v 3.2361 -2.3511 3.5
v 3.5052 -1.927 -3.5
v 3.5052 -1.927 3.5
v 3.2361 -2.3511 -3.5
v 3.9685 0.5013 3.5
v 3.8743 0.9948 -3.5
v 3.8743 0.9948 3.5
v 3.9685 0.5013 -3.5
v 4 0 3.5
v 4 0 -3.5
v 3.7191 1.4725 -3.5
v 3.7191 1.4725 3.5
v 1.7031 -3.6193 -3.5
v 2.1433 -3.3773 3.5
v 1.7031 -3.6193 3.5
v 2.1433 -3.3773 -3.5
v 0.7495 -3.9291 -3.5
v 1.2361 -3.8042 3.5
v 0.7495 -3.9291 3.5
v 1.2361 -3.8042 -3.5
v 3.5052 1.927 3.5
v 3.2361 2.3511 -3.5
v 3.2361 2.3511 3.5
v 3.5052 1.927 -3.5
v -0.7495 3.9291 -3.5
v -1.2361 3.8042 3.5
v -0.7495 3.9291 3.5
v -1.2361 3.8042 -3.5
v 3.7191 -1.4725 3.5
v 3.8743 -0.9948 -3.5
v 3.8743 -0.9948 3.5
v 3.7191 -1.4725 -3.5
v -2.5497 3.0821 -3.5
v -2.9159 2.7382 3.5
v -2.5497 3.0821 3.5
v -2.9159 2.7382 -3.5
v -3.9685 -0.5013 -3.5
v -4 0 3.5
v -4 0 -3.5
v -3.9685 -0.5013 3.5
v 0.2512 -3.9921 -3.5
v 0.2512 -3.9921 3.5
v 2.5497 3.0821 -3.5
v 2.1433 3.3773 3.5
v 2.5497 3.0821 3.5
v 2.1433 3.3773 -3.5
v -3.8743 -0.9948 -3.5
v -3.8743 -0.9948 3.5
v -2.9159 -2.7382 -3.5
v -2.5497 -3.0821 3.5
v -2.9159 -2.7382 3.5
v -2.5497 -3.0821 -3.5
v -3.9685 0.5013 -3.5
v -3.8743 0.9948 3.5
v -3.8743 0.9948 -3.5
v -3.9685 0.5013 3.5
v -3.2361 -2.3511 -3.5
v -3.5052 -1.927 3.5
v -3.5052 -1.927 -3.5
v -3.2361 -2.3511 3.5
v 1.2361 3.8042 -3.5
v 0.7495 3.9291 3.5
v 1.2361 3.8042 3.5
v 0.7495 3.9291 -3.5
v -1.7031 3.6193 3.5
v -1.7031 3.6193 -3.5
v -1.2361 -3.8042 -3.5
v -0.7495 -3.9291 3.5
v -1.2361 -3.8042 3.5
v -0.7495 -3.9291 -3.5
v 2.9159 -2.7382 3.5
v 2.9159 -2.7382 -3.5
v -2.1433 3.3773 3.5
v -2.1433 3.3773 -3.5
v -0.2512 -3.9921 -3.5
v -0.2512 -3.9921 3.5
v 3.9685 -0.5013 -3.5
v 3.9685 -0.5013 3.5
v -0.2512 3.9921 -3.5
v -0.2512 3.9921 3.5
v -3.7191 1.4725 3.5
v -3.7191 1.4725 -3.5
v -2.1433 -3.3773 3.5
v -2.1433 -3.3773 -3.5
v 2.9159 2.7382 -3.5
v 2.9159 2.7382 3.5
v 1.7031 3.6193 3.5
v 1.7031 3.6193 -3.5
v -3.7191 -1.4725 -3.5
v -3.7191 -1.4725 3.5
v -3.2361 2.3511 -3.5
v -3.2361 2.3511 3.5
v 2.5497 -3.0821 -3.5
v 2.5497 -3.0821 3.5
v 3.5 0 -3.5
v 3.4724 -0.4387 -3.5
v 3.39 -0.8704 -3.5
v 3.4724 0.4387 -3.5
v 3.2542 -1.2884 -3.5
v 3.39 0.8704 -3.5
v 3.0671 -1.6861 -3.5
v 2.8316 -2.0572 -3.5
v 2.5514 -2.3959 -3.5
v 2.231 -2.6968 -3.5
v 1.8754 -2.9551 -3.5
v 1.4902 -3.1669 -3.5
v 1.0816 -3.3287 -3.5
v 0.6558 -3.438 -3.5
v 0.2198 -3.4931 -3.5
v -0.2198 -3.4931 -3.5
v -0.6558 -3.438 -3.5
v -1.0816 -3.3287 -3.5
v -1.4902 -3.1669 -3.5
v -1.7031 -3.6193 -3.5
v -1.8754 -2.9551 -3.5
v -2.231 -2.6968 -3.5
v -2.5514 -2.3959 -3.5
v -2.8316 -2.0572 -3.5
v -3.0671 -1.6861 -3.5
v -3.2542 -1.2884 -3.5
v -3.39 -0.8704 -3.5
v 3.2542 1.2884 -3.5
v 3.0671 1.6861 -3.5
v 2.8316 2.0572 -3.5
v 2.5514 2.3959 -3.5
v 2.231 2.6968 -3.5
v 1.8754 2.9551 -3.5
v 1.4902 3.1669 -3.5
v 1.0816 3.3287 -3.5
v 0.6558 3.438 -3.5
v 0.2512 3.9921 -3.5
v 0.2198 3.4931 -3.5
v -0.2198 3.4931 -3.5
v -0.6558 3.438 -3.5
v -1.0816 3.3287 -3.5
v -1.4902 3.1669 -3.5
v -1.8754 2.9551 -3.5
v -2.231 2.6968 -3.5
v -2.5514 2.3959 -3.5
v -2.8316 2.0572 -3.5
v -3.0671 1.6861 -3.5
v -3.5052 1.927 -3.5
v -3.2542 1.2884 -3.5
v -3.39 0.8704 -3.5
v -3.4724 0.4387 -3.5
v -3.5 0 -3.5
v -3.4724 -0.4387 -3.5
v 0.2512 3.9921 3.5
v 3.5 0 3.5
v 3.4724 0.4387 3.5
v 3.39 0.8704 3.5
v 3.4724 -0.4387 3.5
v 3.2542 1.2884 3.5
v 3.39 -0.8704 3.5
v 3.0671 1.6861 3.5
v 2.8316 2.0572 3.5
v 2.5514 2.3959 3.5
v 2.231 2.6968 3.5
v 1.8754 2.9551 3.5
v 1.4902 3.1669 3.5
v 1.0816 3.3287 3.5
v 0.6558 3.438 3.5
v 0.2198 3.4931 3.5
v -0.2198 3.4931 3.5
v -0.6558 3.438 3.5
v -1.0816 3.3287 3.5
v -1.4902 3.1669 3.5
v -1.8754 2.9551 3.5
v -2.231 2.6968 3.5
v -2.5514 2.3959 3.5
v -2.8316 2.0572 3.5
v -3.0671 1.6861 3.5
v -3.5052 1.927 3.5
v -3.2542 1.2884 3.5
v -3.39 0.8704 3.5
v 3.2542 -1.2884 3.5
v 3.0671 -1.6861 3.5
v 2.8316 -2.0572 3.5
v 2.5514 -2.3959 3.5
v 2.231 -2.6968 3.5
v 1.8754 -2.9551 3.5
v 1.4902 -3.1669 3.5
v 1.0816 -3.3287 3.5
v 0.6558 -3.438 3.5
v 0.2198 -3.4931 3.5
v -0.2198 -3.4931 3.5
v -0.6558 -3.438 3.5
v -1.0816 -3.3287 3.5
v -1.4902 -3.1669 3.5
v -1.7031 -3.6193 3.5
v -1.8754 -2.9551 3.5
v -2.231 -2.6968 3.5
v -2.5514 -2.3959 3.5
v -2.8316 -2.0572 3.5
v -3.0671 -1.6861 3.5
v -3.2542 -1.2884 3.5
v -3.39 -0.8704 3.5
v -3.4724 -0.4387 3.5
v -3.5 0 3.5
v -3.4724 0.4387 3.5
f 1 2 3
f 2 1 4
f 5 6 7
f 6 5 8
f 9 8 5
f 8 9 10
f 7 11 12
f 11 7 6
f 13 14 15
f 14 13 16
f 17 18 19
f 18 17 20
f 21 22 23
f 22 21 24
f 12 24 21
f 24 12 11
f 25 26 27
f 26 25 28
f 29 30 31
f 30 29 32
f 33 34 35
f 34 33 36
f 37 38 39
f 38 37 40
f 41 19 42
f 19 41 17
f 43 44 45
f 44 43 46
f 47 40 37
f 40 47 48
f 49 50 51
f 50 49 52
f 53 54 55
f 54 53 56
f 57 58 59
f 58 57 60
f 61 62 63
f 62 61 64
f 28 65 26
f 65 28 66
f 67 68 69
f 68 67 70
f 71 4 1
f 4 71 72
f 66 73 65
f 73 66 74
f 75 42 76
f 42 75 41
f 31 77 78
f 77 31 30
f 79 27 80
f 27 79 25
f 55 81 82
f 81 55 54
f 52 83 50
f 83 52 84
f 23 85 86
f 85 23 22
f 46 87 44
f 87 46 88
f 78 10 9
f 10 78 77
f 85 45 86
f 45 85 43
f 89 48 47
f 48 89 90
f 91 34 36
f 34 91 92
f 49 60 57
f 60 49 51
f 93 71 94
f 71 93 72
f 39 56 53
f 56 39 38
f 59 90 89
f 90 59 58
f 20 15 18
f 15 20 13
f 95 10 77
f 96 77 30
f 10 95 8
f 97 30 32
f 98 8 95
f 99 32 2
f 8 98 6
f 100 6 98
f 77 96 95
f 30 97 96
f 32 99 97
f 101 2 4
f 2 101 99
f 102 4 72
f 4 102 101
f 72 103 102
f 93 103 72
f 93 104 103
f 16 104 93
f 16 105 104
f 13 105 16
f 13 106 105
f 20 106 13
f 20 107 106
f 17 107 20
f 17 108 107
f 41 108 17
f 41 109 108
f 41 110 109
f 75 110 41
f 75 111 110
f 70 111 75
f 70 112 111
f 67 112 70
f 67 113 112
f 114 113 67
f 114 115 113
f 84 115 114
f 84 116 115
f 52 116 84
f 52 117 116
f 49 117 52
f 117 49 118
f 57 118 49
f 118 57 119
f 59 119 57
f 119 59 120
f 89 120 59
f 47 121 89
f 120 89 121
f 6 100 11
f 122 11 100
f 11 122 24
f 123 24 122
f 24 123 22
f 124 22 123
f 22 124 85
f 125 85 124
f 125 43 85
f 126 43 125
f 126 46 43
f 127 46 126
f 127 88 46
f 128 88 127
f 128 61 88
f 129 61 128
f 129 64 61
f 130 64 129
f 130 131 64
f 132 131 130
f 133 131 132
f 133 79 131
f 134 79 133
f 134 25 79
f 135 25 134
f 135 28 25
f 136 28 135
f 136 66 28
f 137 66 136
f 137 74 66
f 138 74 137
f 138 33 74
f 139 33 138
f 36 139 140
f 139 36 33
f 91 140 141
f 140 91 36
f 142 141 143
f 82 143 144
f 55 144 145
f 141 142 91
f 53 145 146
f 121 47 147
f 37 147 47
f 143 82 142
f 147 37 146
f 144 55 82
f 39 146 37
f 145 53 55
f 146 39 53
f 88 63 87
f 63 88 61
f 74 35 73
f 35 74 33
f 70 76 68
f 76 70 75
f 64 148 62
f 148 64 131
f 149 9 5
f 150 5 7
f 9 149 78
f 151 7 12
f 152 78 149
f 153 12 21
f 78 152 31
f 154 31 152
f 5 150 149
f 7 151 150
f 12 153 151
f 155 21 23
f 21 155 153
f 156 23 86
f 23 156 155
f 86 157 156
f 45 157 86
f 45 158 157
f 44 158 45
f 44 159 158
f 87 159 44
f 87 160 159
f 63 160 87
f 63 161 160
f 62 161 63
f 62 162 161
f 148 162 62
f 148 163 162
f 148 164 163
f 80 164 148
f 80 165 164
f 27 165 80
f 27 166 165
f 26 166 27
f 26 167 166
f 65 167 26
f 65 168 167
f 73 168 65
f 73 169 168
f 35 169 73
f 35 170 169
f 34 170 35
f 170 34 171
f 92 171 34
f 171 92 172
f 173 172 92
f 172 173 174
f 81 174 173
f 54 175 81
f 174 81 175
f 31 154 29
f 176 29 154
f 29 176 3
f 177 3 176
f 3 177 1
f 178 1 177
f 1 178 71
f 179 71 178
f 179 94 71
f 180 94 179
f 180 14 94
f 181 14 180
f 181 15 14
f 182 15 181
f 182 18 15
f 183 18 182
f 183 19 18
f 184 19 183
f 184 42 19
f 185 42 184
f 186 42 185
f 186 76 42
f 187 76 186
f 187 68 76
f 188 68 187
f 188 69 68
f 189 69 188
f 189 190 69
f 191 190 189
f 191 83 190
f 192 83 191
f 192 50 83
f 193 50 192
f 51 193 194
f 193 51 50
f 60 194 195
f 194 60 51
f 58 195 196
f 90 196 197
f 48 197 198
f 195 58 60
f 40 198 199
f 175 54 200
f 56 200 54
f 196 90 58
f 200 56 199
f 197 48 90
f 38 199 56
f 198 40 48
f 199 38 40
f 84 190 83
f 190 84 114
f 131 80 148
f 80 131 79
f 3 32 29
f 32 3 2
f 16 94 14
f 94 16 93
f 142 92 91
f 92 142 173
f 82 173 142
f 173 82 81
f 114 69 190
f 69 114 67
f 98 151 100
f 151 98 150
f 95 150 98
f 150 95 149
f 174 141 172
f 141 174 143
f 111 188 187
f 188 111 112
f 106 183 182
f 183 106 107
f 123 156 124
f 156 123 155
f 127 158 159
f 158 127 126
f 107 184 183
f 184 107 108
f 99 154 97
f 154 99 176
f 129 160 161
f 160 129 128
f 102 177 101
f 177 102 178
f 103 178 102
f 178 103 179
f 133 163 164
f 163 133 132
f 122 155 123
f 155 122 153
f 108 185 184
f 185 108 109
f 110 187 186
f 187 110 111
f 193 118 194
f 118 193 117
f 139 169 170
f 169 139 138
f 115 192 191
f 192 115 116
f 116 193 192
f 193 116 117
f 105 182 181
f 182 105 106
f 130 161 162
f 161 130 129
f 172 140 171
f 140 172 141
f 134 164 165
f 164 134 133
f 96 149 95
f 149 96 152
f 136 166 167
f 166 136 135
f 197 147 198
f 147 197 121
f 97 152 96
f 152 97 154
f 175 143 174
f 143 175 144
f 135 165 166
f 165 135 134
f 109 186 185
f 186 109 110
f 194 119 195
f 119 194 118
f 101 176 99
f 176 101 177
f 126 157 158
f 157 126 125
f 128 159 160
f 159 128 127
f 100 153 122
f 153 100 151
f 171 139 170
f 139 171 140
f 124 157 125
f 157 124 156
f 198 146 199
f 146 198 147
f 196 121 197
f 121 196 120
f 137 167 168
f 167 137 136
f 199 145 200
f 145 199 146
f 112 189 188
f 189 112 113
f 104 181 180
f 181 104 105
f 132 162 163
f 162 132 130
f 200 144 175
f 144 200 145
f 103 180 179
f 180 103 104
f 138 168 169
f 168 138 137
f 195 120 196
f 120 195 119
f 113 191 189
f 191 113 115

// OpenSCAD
$fn = 50;


difference() {
	union() {
		translate(v = [0, 0, -3.5000000000]) {
			cylinder(h = 7, r = 4.0000000000);
		}
	}
	union() {
		translate(v = [0, 0, -100.0000000000]) {
			cylinder(h = 200, r = 3.5000000000);
		}
	}
}
